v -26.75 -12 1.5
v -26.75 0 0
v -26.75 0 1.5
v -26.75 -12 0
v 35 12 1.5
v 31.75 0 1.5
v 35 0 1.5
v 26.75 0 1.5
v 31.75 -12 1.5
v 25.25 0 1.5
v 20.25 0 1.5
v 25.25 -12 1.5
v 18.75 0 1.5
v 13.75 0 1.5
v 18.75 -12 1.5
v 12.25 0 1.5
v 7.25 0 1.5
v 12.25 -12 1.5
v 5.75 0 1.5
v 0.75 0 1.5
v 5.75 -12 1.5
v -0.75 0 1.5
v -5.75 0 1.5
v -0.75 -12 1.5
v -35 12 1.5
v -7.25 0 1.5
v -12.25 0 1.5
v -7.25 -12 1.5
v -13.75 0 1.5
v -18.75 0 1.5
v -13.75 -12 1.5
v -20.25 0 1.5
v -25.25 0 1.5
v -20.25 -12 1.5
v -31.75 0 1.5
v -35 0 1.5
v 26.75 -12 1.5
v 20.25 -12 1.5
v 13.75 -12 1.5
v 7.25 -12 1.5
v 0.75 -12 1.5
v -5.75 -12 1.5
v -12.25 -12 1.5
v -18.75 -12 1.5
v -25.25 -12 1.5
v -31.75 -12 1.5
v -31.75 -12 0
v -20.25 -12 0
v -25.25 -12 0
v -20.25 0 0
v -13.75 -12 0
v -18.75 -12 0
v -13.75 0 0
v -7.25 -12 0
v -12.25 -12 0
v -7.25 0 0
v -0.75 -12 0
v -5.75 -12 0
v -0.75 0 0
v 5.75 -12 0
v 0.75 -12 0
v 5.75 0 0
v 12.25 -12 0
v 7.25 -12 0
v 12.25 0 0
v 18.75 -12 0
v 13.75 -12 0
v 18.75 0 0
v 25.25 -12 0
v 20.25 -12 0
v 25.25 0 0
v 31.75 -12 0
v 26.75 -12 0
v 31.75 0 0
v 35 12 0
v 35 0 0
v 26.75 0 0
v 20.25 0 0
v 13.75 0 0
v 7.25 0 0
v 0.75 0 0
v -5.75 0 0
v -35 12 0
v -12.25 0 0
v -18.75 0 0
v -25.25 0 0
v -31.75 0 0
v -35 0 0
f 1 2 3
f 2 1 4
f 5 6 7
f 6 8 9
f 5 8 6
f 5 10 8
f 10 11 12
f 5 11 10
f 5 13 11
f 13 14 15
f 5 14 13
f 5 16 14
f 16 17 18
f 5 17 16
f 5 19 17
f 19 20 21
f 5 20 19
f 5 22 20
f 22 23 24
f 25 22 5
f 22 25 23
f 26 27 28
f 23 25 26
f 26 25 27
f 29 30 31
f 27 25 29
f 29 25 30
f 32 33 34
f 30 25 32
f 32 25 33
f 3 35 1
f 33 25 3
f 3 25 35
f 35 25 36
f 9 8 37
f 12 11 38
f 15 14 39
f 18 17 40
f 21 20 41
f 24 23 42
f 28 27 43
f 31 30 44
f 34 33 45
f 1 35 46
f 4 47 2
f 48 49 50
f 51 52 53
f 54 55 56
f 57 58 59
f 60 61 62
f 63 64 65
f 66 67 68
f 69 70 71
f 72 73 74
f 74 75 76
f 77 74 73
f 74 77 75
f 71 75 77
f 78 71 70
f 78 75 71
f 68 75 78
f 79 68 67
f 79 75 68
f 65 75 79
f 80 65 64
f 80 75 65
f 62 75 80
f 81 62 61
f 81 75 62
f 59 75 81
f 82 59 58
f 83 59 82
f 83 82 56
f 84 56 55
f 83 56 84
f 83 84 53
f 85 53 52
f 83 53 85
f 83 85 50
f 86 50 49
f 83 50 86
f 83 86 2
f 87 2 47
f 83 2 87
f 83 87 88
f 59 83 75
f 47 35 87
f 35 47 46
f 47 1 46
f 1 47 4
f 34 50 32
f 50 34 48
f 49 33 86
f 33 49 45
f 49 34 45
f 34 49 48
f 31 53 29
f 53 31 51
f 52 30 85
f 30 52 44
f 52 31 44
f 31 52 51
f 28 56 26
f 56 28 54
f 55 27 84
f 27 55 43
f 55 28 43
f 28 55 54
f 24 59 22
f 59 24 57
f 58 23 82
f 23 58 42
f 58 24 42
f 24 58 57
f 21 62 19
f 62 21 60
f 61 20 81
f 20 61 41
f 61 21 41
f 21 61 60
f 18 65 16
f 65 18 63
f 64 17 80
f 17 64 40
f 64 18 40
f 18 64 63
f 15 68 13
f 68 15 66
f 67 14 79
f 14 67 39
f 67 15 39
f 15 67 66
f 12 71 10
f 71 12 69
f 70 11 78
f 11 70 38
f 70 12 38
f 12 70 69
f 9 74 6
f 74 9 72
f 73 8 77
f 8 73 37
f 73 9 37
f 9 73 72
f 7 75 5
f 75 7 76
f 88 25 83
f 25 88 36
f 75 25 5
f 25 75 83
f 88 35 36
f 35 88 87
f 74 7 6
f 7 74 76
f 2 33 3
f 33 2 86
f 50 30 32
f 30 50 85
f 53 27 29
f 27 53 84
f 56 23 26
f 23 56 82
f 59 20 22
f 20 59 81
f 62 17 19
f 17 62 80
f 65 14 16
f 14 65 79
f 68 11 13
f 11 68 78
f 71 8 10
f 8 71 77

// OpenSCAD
// 10-well agarose gel comb - printed lying flat
// Units: mm

plate_t     = 1.5;   // plate thickness (Z)
spine_len   = 70;    // spine length (X)
spine_w     = 12;    // spine width (Y)
tooth_w     = 5.0;   // tooth width (X)
tooth_l     = 12;    // tooth length (Y)
tooth_n     = 10;    // number of teeth
gap         = 1.5;   // gap between teeth (X)
overcut     = 0.5;   // cutter overshoot past faces

$fn = 64;

pitch = tooth_w + gap;          // centre-to-centre spacing
x0    = -(tooth_n - 1) * pitch / 2;

union() {
    // Spine
    translate([-spine_len / 2, 0, 0])
        cube([spine_len, spine_w, plate_t]);

    // Teeth, centred on spine in X
    for (i = [0 : tooth_n - 1])
        translate([x0 + i * pitch - tooth_w / 2,
                   -tooth_l,
                   0])
            cube([tooth_w, tooth_l + tooth_w / 2, plate_t]);
}

difference() {
    // Combine spine and teeth
    union() {
        translate([-spine_len / 2, 0, 0])
            cube([spine_len, spine_w, plate_t]);

        for (i = [0 : tooth_n - 1])
            translate([x0 + i * pitch - tooth_w / 2,
                       -tooth_l,
                       0])
                cube([tooth_w, tooth_l + tooth_w / 2, plate_t]);
    }

    // Open the well gaps from above
    for (i = [1 : tooth_n - 1])
        translate([x0 + i * pitch - tooth_w / 2 - overcut,
                   -tooth_l - overcut,
                   -overcut])
            cube([tooth_w + 2 * overcut,
                  tooth_l + tooth_w / 2 + 2 * overcut,
                  plate_t + 2 * overcut]);
}
